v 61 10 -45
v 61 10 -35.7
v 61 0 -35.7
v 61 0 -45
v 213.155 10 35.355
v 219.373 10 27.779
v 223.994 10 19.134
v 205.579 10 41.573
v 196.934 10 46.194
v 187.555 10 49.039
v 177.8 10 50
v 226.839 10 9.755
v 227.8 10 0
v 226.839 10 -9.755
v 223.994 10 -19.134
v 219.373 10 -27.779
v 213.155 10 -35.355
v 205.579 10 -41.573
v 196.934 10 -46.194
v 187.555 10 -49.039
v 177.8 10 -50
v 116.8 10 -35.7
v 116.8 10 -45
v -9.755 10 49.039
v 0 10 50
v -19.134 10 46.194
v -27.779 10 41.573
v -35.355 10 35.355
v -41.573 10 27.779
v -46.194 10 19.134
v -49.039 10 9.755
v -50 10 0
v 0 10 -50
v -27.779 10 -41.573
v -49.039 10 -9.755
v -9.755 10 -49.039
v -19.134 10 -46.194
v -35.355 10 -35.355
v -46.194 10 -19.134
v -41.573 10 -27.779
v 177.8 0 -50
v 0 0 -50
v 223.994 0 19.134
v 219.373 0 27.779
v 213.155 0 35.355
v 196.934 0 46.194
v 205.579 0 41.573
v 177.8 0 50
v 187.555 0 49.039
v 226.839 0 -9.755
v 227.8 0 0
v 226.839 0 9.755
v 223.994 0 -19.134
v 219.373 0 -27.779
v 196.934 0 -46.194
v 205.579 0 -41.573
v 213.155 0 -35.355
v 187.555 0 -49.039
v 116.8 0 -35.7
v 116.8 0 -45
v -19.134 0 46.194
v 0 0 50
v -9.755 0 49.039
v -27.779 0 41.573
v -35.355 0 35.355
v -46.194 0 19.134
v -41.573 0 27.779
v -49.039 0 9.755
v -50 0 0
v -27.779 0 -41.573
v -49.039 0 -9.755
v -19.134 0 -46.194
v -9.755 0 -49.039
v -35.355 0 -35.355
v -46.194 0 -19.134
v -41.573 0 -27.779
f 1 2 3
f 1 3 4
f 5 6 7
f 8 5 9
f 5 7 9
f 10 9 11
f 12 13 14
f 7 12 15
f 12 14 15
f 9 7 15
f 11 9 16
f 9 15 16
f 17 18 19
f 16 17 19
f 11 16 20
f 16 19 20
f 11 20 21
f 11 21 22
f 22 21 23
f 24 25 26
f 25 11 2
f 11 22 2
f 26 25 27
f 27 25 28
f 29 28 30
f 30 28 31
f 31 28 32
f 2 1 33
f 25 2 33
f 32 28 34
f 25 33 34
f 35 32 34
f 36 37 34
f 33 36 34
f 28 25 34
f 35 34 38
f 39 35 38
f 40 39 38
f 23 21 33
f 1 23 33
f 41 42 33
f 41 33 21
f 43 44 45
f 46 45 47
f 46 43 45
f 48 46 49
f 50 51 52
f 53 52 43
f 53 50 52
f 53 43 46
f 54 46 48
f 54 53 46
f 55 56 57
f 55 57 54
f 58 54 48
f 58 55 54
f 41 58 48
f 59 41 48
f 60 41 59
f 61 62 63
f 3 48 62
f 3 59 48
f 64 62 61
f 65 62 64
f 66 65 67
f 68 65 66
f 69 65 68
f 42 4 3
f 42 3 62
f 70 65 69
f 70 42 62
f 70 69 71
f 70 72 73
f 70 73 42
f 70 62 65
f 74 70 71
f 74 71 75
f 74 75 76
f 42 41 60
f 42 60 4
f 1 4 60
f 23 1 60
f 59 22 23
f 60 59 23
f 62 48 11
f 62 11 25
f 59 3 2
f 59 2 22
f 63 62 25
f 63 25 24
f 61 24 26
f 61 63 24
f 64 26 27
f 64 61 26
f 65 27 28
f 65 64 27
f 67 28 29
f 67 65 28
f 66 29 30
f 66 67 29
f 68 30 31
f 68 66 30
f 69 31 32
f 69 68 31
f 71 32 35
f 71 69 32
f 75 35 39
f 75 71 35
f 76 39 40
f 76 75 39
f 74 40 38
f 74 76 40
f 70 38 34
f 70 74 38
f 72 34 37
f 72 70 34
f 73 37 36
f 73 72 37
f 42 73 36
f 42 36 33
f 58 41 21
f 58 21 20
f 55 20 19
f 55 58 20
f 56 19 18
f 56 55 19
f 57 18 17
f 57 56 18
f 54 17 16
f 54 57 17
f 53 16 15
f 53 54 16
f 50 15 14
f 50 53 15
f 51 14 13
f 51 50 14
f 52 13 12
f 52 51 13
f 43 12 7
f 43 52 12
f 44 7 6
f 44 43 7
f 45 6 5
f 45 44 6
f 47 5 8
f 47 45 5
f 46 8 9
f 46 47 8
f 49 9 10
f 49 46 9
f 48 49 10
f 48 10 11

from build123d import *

# Parameters (mm, degrees)
SKETCH1_W           = 55.8
SKETCH1_H           = 9.3
BOSS_EXTRUDE1_DEPTH = 10


with BuildPart() as part:
    # Sketch1 → Boss-Extrude1 (new body)
    with BuildSketch(Plane(origin=(0, 0, 0), x_dir=(1, 0, 0), z_dir=(0, 1, 0))):
        with BuildLine():
            Line((0, 50), (177.8, 50))
            ThreePointArc((177.8, 50), (227.8, 0), (177.8, -50))
            Line((177.8, -50), (0, -50))
            ThreePointArc((0, -50), (-50, 0), (0, 50))
        make_face()
        with Locations((88.9, 40.35)):
            Rectangle(SKETCH1_W, SKETCH1_H, mode=Mode.SUBTRACT)
    extrude(amount=BOSS_EXTRUDE1_DEPTH)


solid = part.part
